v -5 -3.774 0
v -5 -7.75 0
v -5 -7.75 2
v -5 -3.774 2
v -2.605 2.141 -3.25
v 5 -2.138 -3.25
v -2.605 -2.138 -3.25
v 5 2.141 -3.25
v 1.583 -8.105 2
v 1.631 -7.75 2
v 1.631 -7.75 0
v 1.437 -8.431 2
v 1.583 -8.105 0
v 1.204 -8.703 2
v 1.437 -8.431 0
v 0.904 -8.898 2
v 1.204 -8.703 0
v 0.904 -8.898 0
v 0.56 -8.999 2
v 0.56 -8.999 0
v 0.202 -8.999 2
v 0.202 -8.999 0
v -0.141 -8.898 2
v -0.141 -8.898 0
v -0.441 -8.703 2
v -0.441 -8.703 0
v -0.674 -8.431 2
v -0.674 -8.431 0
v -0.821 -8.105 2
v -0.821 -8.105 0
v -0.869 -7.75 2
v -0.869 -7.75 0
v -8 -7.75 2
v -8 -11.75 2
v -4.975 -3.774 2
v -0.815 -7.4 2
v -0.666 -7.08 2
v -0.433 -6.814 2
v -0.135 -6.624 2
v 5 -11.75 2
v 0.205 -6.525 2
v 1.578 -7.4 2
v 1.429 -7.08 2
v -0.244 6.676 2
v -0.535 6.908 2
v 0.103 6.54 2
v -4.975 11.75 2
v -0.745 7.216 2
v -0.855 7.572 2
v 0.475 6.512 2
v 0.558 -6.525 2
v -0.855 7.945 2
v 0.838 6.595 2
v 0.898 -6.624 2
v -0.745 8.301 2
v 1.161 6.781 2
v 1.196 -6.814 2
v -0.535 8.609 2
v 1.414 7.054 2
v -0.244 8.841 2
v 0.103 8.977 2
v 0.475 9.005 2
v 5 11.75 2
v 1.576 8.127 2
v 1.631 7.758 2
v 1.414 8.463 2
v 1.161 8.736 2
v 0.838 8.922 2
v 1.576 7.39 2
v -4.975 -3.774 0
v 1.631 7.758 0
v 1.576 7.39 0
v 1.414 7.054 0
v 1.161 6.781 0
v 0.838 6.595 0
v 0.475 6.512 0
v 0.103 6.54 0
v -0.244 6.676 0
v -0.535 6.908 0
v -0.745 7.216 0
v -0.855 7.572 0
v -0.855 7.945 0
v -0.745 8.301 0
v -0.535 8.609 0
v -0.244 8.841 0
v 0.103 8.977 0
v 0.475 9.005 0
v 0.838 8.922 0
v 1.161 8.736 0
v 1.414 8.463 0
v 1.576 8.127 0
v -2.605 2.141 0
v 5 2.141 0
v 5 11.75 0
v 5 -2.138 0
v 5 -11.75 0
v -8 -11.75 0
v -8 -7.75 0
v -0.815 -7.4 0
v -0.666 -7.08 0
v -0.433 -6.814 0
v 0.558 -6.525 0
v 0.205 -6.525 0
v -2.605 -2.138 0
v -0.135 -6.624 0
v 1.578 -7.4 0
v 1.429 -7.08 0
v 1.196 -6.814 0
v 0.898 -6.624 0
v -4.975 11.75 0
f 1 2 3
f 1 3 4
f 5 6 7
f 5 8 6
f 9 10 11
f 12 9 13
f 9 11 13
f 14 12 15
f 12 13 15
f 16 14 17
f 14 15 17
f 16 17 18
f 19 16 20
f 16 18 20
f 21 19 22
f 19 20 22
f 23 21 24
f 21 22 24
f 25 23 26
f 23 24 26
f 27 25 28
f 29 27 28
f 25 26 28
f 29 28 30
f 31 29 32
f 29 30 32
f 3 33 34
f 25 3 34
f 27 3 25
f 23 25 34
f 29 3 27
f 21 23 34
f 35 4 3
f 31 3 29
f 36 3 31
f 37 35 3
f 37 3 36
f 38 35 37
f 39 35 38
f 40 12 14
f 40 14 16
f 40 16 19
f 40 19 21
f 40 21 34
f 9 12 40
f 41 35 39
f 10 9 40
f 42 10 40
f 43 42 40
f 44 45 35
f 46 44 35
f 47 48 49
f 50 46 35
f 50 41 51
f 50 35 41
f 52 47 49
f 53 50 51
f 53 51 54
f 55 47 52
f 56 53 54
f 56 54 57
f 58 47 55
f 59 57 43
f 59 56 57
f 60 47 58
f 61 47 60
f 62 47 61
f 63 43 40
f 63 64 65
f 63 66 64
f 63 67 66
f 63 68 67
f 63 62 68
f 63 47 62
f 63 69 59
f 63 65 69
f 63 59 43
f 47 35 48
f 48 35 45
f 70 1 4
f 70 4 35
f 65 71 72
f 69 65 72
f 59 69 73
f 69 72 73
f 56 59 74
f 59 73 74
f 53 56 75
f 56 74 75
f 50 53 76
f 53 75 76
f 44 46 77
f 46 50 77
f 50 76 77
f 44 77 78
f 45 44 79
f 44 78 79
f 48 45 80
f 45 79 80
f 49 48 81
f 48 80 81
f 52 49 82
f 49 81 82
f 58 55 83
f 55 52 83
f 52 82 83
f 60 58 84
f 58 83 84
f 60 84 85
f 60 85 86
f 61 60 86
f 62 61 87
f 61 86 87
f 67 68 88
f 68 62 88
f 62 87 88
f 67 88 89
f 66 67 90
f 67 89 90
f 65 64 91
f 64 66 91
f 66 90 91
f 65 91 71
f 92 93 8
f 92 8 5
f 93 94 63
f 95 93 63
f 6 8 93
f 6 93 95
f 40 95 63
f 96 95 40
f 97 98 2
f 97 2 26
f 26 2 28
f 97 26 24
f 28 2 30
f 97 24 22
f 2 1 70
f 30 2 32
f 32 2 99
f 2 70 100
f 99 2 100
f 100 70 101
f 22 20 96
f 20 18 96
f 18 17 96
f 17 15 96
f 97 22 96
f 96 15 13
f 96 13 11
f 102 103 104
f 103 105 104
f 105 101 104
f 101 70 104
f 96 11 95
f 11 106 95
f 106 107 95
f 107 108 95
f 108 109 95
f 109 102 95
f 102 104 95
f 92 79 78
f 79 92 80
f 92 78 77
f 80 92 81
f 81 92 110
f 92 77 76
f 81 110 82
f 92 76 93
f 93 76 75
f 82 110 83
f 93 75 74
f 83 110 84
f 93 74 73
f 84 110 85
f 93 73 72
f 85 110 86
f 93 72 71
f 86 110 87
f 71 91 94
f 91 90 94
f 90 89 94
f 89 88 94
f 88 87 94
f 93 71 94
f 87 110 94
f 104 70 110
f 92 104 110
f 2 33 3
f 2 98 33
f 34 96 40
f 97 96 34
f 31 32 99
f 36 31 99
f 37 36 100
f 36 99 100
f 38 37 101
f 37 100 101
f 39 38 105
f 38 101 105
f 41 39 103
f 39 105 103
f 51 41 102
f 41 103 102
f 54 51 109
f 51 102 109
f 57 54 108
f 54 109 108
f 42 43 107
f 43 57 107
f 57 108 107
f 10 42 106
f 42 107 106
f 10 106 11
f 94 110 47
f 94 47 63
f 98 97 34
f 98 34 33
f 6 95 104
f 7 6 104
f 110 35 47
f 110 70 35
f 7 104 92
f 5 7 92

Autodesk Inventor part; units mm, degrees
ref_plane "YZ Plane" through (0, 0, 0) normal (1, 0, 0) x (0, 1, 0)
ref_plane "XZ Plane" through (0, 0, 0) normal (0, 1, 0) x (-1, 0, 0)
sketch "Эскиз1" plane through (0, 0, 0) normal (0, 0, 1) x (1, 0, 0)
  circle A0 centre (0.3813, 7.7585) radius 1.25 projected
  line L0 (-4.9754, 3.7665) -> (-4.9754, 11.75) projected
  line L1 (5, 3.7665) -> (-4.9754, 3.7665) projected
  line L2 (5, 11.75) -> (5, 3.7665) projected
  line L3 (-4.9754, 11.75) -> (5, 11.75) projected
  arc A1 (1.6313, -7.75) -> (-0.8686, -7.75) centre (0.3813, -7.762) ccw projected
  line L4 (-0.8686, -7.75) -> (1.6313, -7.75) projected
  line L5 (5, -11.75) -> (-8, -11.75) projected
  line L6 (5, -3.7735) -> (5, -11.75) projected
  line L7 (-5, -3.7735) -> (5, -3.7735) projected
  line L8 (-5, -7.75) -> (-5, -3.7735) projected
  line L9 (-8, -7.75) -> (-5, -7.75) projected
  line L10 (-8, -11.75) -> (-8, -7.75) projected
  line L11 (3.0114, -0.7535) -> (3.0052, -0.7535) projected
  line L12 (3.0114, -0.7535) -> (3.0114, -0.7535) projected
  arc A2 (3.5595, -1.3518) -> (3.0114, -0.7535) centre (3.0062, -1.3085) ccw projected
  arc A3 (3.5595, -1.3518) -> (3.709, -1.5135) centre (3.709, -1.3635) ccw projected
  line L13 (4.3002, -1.5135) -> (3.709, -1.5135) projected
  arc A4 (4.3002, -1.5135) -> (4.4502, -1.3635) centre (4.3002, -1.3635) ccw projected
  line L14 (4.4502, -1.2761) -> (4.4502, -1.3635) projected
  line L15 (4.4521, -1.2761) -> (4.4502, -1.2761) projected
  arc A5 (5, -0.7535) -> (4.4521, -1.2761) centre (5.0062, -1.3085) ccw projected
  line L16 (5, 0.7465) -> (5, -0.7535) projected
  arc A6 (4.4521, 1.2691) -> (5, 0.7465) centre (5.0062, 1.3015) ccw projected
  line L17 (4.4502, 1.2691) -> (4.4521, 1.2691) projected
  line L18 (4.4502, 1.3565) -> (4.4502, 1.2691) projected
  arc A7 (4.4502, 1.3565) -> (4.3002, 1.5065) centre (4.3002, 1.3565) ccw projected
  line L19 (3.709, 1.5065) -> (4.3002, 1.5065) projected
  arc A8 (3.709, 1.5065) -> (3.5595, 1.3448) centre (3.709, 1.3565) ccw projected
  arc A9 (3.0114, 0.7465) -> (3.5595, 1.3448) centre (3.0062, 1.3015) ccw projected
  line L20 (3.0114, 0.7465) -> (3.0114, 0.7465) projected
  line L21 (3.0052, 0.7465) -> (3.0114, 0.7465) projected
  line L22 (3.0052, 0.7465) -> (3.0052, 0.7465) projected
  arc A10 (2.4583, 1.2691) -> (3.0052, 0.7465) centre (3.0123, 1.3015) ccw projected
  line L23 (2.4564, 1.2691) -> (2.4583, 1.2691) projected
  line L24 (2.4564, 1.3565) -> (2.4564, 1.2691) projected
  arc A11 (2.4564, 1.3565) -> (2.3064, 1.5065) centre (2.3064, 1.3565) ccw projected
  line L25 (1.7152, 1.5065) -> (2.3064, 1.5065) projected
  arc A12 (1.7152, 1.5065) -> (1.5656, 1.3448) centre (1.7152, 1.3565) ccw projected
  arc A13 (1.0175, 0.7465) -> (1.5656, 1.3448) centre (1.0123, 1.3015) ccw projected
  line L26 (1.0175, 0.7465) -> (1.0175, 0.7465) projected
  line L27 (1.0114, 0.7465) -> (1.0175, 0.7465) projected
  line L28 (1.0114, 0.7465) -> (1.0114, 0.7465) projected
  arc A14 (0.4644, 1.2691) -> (1.0114, 0.7465) centre (1.0185, 1.3015) ccw projected
  line L29 (0.4625, 1.2691) -> (0.4644, 1.2691) projected
  line L30 (0.4625, 1.3565) -> (0.4625, 1.2691) projected
  arc A15 (0.4625, 1.3565) -> (0.3125, 1.5065) centre (0.3125, 1.3565) ccw projected
  line L31 (-0.2787, 1.5065) -> (0.3125, 1.5065) projected
  arc A16 (-0.2787, 1.5065) -> (-0.4282, 1.3448) centre (-0.2787, 1.3565) ccw projected
  arc A17 (-0.9763, 0.7465) -> (-0.4282, 1.3448) centre (-0.9815, 1.3015) ccw projected
  line L32 (-0.9763, 0.7465) -> (-0.9763, 0.7465) projected
  line L33 (-0.9825, 0.7465) -> (-0.9763, 0.7465) projected
  line L34 (-0.9825, 0.7465) -> (-0.9825, 0.7465) projected
  arc A18 (-1.5294, 1.2691) -> (-0.9825, 0.7465) centre (-0.9754, 1.3015) ccw projected
  line L35 (-1.5313, 1.2691) -> (-1.5294, 1.2691) projected
  line L36 (-1.5313, 1.3565) -> (-1.5313, 1.2691) projected
  arc A19 (-1.5313, 1.3565) -> (-1.6813, 1.5065) centre (-1.6813, 1.3565) ccw projected
  line L37 (-2.2725, 1.5065) -> (-1.6813, 1.5065) projected
  arc A20 (-2.2725, 1.5065) -> (-2.4221, 1.3448) centre (-2.2725, 1.3565) ccw projected
  arc A21 (-2.9754, 0.7465) -> (-2.4221, 1.3448) centre (-2.9754, 1.3015) ccw projected
  line L38 (-2.9754, 0.7465) -> (-2.9754, 2.2665) projected
  line L39 (5, 2.2665) -> (-2.9754, 2.2665) projected
  line L40 (5, 3.7665) -> (5, 2.2665) projected
  line L41 (-4.9754, 3.7665) -> (5, 3.7665) projected
  line L42 (-4.9754, -3.7735) -> (-4.9754, 3.7665) projected
  line L43 (5, -3.7735) -> (-4.9754, -3.7735) projected
  line L44 (5, -2.2735) -> (5, -3.7735) projected
  line L45 (-2.9754, -2.2735) -> (5, -2.2735) projected
  line L46 (-2.9754, -2.2735) -> (-2.9754, -0.7535) projected
  arc A22 (-2.4221, -1.3518) -> (-2.9754, -0.7535) centre (-2.9754, -1.3085) ccw projected
  arc A23 (-2.4221, -1.3518) -> (-2.2725, -1.5135) centre (-2.2725, -1.3635) ccw projected
  line L47 (-1.6813, -1.5135) -> (-2.2725, -1.5135) projected
  arc A24 (-1.6813, -1.5135) -> (-1.5313, -1.3635) centre (-1.6813, -1.3635) ccw projected
  line L48 (-1.5313, -1.2761) -> (-1.5313, -1.3635) projected
  line L49 (-1.5294, -1.2761) -> (-1.5313, -1.2761) projected
  arc A25 (-0.9825, -0.7535) -> (-1.5294, -1.2761) centre (-0.9754, -1.3085) ccw projected
  line L50 (-0.9825, -0.7535) -> (-0.9825, -0.7535) projected
  line L51 (-0.9763, -0.7535) -> (-0.9825, -0.7535) projected
  line L52 (-0.9763, -0.7535) -> (-0.9763, -0.7535) projected
  arc A26 (-0.4282, -1.3518) -> (-0.9763, -0.7535) centre (-0.9815, -1.3085) ccw projected
  arc A27 (-0.4282, -1.3518) -> (-0.2787, -1.5135) centre (-0.2787, -1.3635) ccw projected
  line L53 (0.3125, -1.5135) -> (-0.2787, -1.5135) projected
  arc A28 (0.3125, -1.5135) -> (0.4625, -1.3635) centre (0.3125, -1.3635) ccw projected
  line L54 (0.4625, -1.2761) -> (0.4625, -1.3635) projected
  line L55 (0.4644, -1.2761) -> (0.4625, -1.2761) projected
  arc A29 (1.0114, -0.7535) -> (0.4644, -1.2761) centre (1.0185, -1.3085) ccw projected
  line L56 (1.0114, -0.7535) -> (1.0114, -0.7535) projected
  line L57 (1.0175, -0.7535) -> (1.0114, -0.7535) projected
  line L58 (1.0175, -0.7535) -> (1.0175, -0.7535) projected
  arc A30 (1.5656, -1.3518) -> (1.0175, -0.7535) centre (1.0123, -1.3085) ccw projected
  arc A31 (1.5656, -1.3518) -> (1.7152, -1.5135) centre (1.7152, -1.3635) ccw projected
  line L59 (2.3064, -1.5135) -> (1.7152, -1.5135) projected
  arc A32 (2.3064, -1.5135) -> (2.4564, -1.3635) centre (2.3064, -1.3635) ccw projected
  line L60 (2.4564, -1.2761) -> (2.4564, -1.3635) projected
  line L61 (2.4583, -1.2761) -> (2.4564, -1.2761) projected
  arc A33 (3.0052, -0.7535) -> (2.4583, -1.2761) centre (3.0123, -1.3085) ccw projected
  line L62 (3.0052, -0.7535) -> (3.0052, -0.7535) projected
  circle A34 centre (0.3813, -7.762) radius 1.25
  line L63 (5, 2.2665) -> (5, -2.2735)
  point P0 (0, 0)
  point P1 (5, -0.7535)
  point P2 (-0.8686, -7.75)
extrude "Выдавливание1" add sketch "Эскиз1" along normal blind 2
sketch "Эскиз2" plane through (0, 0, 0) normal (0, 0, -1) x (-1, 0, 0)
  line L0 (-5, 2.2665) -> (-5, 0.7465) projected
  line L1 (-3.0114, -0.7535) -> (-3.0052, -0.7535) projected
  line L2 (-3.0114, -0.7535) -> (-3.0114, -0.7535) projected
  arc A0 (-3.0114, -0.7535) -> (-3.5595, -1.3518) centre (-3.0062, -1.3085) ccw projected
  arc A1 (-3.709, -1.5135) -> (-3.5595, -1.3518) centre (-3.709, -1.3635) ccw projected
  line L3 (-4.3002, -1.5135) -> (-3.709, -1.5135) projected
  arc A2 (-4.4502, -1.3635) -> (-4.3002, -1.5135) centre (-4.3002, -1.3635) ccw projected
  line L4 (-4.4502, -1.2761) -> (-4.4502, -1.3635) projected
  line L5 (-4.4521, -1.2761) -> (-4.4502, -1.2761) projected
  arc A3 (-4.4521, -1.2761) -> (-5, -0.7535) centre (-5.0062, -1.3085) ccw projected
  line L6 (-5, 0.7465) -> (-5, -0.7535) projected
  arc A4 (-5, 0.7465) -> (-4.4521, 1.2691) centre (-5.0062, 1.3015) ccw projected
  line L7 (-4.4502, 1.2691) -> (-4.4521, 1.2691) projected
  line L8 (-4.4502, 1.3565) -> (-4.4502, 1.2691) projected
  arc A5 (-4.3002, 1.5065) -> (-4.4502, 1.3565) centre (-4.3002, 1.3565) ccw projected
  line L9 (-3.709, 1.5065) -> (-4.3002, 1.5065) projected
  arc A6 (-3.5595, 1.3448) -> (-3.709, 1.5065) centre (-3.709, 1.3565) ccw projected
  arc A7 (-3.5595, 1.3448) -> (-3.0114, 0.7465) centre (-3.0062, 1.3015) ccw projected
  line L10 (-3.0114, 0.7465) -> (-3.0114, 0.7465) projected
  line L11 (-3.0052, 0.7465) -> (-3.0114, 0.7465) projected
  line L12 (-3.0052, 0.7465) -> (-3.0052, 0.7465) projected
  arc A8 (-3.0052, 0.7465) -> (-2.4583, 1.2691) centre (-3.0123, 1.3015) ccw projected
  line L13 (-2.4564, 1.2691) -> (-2.4583, 1.2691) projected
  line L14 (-2.4564, 1.3565) -> (-2.4564, 1.2691) projected
  arc A9 (-2.3064, 1.5065) -> (-2.4564, 1.3565) centre (-2.3064, 1.3565) ccw projected
  line L15 (-1.7152, 1.5065) -> (-2.3064, 1.5065) projected
  arc A10 (-1.5656, 1.3448) -> (-1.7152, 1.5065) centre (-1.7152, 1.3565) ccw projected
  arc A11 (-1.5656, 1.3448) -> (-1.0175, 0.7465) centre (-1.0123, 1.3015) ccw projected
  line L16 (-1.0175, 0.7465) -> (-1.0175, 0.7465) projected
  line L17 (-1.0114, 0.7465) -> (-1.0175, 0.7465) projected
  line L18 (-1.0114, 0.7465) -> (-1.0114, 0.7465) projected
  arc A12 (-1.0114, 0.7465) -> (-0.4644, 1.2691) centre (-1.0185, 1.3015) ccw projected
  line L19 (-0.4625, 1.2691) -> (-0.4644, 1.2691) projected
  line L20 (-0.4625, 1.3565) -> (-0.4625, 1.2691) projected
  arc A13 (-0.3125, 1.5065) -> (-0.4625, 1.3565) centre (-0.3125, 1.3565) ccw projected
  line L21 (0.2787, 1.5065) -> (-0.3125, 1.5065) projected
  arc A14 (0.4282, 1.3448) -> (0.2787, 1.5065) centre (0.2787, 1.3565) ccw projected
  arc A15 (0.4282, 1.3448) -> (0.9763, 0.7465) centre (0.9815, 1.3015) ccw projected
  line L22 (0.9763, 0.7465) -> (0.9763, 0.7465) projected
  line L23 (0.9825, 0.7465) -> (0.9763, 0.7465) projected
  line L24 (0.9825, 0.7465) -> (0.9825, 0.7465) projected
  arc A16 (0.9825, 0.7465) -> (1.5294, 1.2691) centre (0.9754, 1.3015) ccw projected
  line L25 (1.5313, 1.2691) -> (1.5294, 1.2691) projected
  line L26 (1.5313, 1.3565) -> (1.5313, 1.2691) projected
  arc A17 (1.6813, 1.5065) -> (1.5313, 1.3565) centre (1.6813, 1.3565) ccw projected
  line L27 (2.2725, 1.5065) -> (1.6813, 1.5065) projected
  arc A18 (2.4221, 1.3448) -> (2.2725, 1.5065) centre (2.2725, 1.3565) ccw projected
  arc A19 (2.4221, 1.3448) -> (2.9754, 0.7465) centre (2.9754, 1.3015) ccw projected
  line L28 (2.9754, 0.7465) -> (2.9754, 2.2665) projected
  line L29 (-5, 2.2665) -> (2.9754, 2.2665) projected
  line L30 (-5, 3.7665) -> (-5, 2.2665) projected
  line L31 (4.9754, 3.7665) -> (-5, 3.7665) projected
  line L32 (4.9754, -3.7735) -> (4.9754, 3.7665) projected
  line L33 (-5, -3.7735) -> (4.9754, -3.7735) projected
  line L34 (-5, -2.2735) -> (-5, -3.7735) projected
  line L35 (2.9754, -2.2735) -> (-5, -2.2735) projected
  line L36 (2.9754, -2.2735) -> (2.9754, -0.7535) projected
  arc A20 (2.9754, -0.7535) -> (2.4221, -1.3518) centre (2.9754, -1.3085) ccw projected
  arc A21 (2.2725, -1.5135) -> (2.4221, -1.3518) centre (2.2725, -1.3635) ccw projected
  line L37 (1.6813, -1.5135) -> (2.2725, -1.5135) projected
  arc A22 (1.5313, -1.3635) -> (1.6813, -1.5135) centre (1.6813, -1.3635) ccw projected
  line L38 (1.5313, -1.2761) -> (1.5313, -1.3635) projected
  line L39 (1.5294, -1.2761) -> (1.5313, -1.2761) projected
  arc A23 (1.5294, -1.2761) -> (0.9825, -0.7535) centre (0.9754, -1.3085) ccw projected
  line L40 (0.9825, -0.7535) -> (0.9825, -0.7535) projected
  line L41 (0.9763, -0.7535) -> (0.9825, -0.7535) projected
  line L42 (0.9763, -0.7535) -> (0.9763, -0.7535) projected
  arc A24 (0.9763, -0.7535) -> (0.4282, -1.3518) centre (0.9815, -1.3085) ccw projected
  arc A25 (0.2787, -1.5135) -> (0.4282, -1.3518) centre (0.2787, -1.3635) ccw projected
  line L43 (-0.3125, -1.5135) -> (0.2787, -1.5135) projected
  arc A26 (-0.4625, -1.3635) -> (-0.3125, -1.5135) centre (-0.3125, -1.3635) ccw projected
  line L44 (-0.4625, -1.2761) -> (-0.4625, -1.3635) projected
  line L45 (-0.4644, -1.2761) -> (-0.4625, -1.2761) projected
  arc A27 (-0.4644, -1.2761) -> (-1.0114, -0.7535) centre (-1.0185, -1.3085) ccw projected
  line L46 (-1.0114, -0.7535) -> (-1.0114, -0.7535) projected
  line L47 (-1.0175, -0.7535) -> (-1.0114, -0.7535) projected
  line L48 (-1.0175, -0.7535) -> (-1.0175, -0.7535) projected
  arc A28 (-1.0175, -0.7535) -> (-1.5656, -1.3518) centre (-1.0123, -1.3085) ccw projected
  arc A29 (-1.7152, -1.5135) -> (-1.5656, -1.3518) centre (-1.7152, -1.3635) ccw projected
  line L49 (-2.3064, -1.5135) -> (-1.7152, -1.5135) projected
  arc A30 (-2.4564, -1.3635) -> (-2.3064, -1.5135) centre (-2.3064, -1.3635) ccw projected
  line L50 (-2.4564, -1.2761) -> (-2.4564, -1.3635) projected
  line L51 (-2.4583, -1.2761) -> (-2.4564, -1.2761) projected
  arc A31 (-2.4583, -1.2761) -> (-3.0052, -0.7535) centre (-3.0123, -1.3085) ccw projected
  line L52 (-3.0052, -0.7535) -> (-3.0052, -0.7535) projected
  line L53 (-5, -11.75) -> (-5, 11.75) projected
  line L54 (-5, -2.1382) -> (-5, 2.1409)
  line L55 (-5, -2.1382) -> (2.6046, -2.1382)
  line L56 (2.6046, -2.1382) -> (2.6046, 2.1409)
  line L57 (-5, 2.1409) -> (2.6046, 2.1409)
  line L58 (-5, -11.75) -> (-5, 11.75) projected
  point P0 (0, 0)
ref_plane "РабПлоскость1" through (-4.9754, -3.7735, -3.25) normal (0, 0, 1) x (1, 0, 0)
extrude "Выдавливание2" add sketch "Эскиз2" along normal up to surface (3.25 mm away) contours L57 L56 A19 A18 L27 A17 L26 A16 L23 A15 A14 L21 A13 L20 A12 L17 A11 A10 L15 A9 L14 A8 L11 A7 A6 L9 A5 L8 A4 L0 | A4 L8 A5 L9 A6 A7 L11 A8 L14 A9 L15 A10 A11 L17 A12 L20 A13 L21 A14 A15 L23 A16 L26 A17 L27 A18 A19 L56 A20 A21 L37 A22 L38 A23 L41 A24 A25 L43 A26 L44 A27 L47 A28 A29 L49 A30 L50 A31 L1 A0 A1 L3 A2 L4 A3 L6 | A3 L4 A2 L3 A1 A0 L1 A31 L50 A30 L49 A29 A28 L47 A27 L44 A26 L43 A25 A24 L41 A23 L38 A22 L37 A21 A20 L56 L55 L53
properties part number "крышка"
